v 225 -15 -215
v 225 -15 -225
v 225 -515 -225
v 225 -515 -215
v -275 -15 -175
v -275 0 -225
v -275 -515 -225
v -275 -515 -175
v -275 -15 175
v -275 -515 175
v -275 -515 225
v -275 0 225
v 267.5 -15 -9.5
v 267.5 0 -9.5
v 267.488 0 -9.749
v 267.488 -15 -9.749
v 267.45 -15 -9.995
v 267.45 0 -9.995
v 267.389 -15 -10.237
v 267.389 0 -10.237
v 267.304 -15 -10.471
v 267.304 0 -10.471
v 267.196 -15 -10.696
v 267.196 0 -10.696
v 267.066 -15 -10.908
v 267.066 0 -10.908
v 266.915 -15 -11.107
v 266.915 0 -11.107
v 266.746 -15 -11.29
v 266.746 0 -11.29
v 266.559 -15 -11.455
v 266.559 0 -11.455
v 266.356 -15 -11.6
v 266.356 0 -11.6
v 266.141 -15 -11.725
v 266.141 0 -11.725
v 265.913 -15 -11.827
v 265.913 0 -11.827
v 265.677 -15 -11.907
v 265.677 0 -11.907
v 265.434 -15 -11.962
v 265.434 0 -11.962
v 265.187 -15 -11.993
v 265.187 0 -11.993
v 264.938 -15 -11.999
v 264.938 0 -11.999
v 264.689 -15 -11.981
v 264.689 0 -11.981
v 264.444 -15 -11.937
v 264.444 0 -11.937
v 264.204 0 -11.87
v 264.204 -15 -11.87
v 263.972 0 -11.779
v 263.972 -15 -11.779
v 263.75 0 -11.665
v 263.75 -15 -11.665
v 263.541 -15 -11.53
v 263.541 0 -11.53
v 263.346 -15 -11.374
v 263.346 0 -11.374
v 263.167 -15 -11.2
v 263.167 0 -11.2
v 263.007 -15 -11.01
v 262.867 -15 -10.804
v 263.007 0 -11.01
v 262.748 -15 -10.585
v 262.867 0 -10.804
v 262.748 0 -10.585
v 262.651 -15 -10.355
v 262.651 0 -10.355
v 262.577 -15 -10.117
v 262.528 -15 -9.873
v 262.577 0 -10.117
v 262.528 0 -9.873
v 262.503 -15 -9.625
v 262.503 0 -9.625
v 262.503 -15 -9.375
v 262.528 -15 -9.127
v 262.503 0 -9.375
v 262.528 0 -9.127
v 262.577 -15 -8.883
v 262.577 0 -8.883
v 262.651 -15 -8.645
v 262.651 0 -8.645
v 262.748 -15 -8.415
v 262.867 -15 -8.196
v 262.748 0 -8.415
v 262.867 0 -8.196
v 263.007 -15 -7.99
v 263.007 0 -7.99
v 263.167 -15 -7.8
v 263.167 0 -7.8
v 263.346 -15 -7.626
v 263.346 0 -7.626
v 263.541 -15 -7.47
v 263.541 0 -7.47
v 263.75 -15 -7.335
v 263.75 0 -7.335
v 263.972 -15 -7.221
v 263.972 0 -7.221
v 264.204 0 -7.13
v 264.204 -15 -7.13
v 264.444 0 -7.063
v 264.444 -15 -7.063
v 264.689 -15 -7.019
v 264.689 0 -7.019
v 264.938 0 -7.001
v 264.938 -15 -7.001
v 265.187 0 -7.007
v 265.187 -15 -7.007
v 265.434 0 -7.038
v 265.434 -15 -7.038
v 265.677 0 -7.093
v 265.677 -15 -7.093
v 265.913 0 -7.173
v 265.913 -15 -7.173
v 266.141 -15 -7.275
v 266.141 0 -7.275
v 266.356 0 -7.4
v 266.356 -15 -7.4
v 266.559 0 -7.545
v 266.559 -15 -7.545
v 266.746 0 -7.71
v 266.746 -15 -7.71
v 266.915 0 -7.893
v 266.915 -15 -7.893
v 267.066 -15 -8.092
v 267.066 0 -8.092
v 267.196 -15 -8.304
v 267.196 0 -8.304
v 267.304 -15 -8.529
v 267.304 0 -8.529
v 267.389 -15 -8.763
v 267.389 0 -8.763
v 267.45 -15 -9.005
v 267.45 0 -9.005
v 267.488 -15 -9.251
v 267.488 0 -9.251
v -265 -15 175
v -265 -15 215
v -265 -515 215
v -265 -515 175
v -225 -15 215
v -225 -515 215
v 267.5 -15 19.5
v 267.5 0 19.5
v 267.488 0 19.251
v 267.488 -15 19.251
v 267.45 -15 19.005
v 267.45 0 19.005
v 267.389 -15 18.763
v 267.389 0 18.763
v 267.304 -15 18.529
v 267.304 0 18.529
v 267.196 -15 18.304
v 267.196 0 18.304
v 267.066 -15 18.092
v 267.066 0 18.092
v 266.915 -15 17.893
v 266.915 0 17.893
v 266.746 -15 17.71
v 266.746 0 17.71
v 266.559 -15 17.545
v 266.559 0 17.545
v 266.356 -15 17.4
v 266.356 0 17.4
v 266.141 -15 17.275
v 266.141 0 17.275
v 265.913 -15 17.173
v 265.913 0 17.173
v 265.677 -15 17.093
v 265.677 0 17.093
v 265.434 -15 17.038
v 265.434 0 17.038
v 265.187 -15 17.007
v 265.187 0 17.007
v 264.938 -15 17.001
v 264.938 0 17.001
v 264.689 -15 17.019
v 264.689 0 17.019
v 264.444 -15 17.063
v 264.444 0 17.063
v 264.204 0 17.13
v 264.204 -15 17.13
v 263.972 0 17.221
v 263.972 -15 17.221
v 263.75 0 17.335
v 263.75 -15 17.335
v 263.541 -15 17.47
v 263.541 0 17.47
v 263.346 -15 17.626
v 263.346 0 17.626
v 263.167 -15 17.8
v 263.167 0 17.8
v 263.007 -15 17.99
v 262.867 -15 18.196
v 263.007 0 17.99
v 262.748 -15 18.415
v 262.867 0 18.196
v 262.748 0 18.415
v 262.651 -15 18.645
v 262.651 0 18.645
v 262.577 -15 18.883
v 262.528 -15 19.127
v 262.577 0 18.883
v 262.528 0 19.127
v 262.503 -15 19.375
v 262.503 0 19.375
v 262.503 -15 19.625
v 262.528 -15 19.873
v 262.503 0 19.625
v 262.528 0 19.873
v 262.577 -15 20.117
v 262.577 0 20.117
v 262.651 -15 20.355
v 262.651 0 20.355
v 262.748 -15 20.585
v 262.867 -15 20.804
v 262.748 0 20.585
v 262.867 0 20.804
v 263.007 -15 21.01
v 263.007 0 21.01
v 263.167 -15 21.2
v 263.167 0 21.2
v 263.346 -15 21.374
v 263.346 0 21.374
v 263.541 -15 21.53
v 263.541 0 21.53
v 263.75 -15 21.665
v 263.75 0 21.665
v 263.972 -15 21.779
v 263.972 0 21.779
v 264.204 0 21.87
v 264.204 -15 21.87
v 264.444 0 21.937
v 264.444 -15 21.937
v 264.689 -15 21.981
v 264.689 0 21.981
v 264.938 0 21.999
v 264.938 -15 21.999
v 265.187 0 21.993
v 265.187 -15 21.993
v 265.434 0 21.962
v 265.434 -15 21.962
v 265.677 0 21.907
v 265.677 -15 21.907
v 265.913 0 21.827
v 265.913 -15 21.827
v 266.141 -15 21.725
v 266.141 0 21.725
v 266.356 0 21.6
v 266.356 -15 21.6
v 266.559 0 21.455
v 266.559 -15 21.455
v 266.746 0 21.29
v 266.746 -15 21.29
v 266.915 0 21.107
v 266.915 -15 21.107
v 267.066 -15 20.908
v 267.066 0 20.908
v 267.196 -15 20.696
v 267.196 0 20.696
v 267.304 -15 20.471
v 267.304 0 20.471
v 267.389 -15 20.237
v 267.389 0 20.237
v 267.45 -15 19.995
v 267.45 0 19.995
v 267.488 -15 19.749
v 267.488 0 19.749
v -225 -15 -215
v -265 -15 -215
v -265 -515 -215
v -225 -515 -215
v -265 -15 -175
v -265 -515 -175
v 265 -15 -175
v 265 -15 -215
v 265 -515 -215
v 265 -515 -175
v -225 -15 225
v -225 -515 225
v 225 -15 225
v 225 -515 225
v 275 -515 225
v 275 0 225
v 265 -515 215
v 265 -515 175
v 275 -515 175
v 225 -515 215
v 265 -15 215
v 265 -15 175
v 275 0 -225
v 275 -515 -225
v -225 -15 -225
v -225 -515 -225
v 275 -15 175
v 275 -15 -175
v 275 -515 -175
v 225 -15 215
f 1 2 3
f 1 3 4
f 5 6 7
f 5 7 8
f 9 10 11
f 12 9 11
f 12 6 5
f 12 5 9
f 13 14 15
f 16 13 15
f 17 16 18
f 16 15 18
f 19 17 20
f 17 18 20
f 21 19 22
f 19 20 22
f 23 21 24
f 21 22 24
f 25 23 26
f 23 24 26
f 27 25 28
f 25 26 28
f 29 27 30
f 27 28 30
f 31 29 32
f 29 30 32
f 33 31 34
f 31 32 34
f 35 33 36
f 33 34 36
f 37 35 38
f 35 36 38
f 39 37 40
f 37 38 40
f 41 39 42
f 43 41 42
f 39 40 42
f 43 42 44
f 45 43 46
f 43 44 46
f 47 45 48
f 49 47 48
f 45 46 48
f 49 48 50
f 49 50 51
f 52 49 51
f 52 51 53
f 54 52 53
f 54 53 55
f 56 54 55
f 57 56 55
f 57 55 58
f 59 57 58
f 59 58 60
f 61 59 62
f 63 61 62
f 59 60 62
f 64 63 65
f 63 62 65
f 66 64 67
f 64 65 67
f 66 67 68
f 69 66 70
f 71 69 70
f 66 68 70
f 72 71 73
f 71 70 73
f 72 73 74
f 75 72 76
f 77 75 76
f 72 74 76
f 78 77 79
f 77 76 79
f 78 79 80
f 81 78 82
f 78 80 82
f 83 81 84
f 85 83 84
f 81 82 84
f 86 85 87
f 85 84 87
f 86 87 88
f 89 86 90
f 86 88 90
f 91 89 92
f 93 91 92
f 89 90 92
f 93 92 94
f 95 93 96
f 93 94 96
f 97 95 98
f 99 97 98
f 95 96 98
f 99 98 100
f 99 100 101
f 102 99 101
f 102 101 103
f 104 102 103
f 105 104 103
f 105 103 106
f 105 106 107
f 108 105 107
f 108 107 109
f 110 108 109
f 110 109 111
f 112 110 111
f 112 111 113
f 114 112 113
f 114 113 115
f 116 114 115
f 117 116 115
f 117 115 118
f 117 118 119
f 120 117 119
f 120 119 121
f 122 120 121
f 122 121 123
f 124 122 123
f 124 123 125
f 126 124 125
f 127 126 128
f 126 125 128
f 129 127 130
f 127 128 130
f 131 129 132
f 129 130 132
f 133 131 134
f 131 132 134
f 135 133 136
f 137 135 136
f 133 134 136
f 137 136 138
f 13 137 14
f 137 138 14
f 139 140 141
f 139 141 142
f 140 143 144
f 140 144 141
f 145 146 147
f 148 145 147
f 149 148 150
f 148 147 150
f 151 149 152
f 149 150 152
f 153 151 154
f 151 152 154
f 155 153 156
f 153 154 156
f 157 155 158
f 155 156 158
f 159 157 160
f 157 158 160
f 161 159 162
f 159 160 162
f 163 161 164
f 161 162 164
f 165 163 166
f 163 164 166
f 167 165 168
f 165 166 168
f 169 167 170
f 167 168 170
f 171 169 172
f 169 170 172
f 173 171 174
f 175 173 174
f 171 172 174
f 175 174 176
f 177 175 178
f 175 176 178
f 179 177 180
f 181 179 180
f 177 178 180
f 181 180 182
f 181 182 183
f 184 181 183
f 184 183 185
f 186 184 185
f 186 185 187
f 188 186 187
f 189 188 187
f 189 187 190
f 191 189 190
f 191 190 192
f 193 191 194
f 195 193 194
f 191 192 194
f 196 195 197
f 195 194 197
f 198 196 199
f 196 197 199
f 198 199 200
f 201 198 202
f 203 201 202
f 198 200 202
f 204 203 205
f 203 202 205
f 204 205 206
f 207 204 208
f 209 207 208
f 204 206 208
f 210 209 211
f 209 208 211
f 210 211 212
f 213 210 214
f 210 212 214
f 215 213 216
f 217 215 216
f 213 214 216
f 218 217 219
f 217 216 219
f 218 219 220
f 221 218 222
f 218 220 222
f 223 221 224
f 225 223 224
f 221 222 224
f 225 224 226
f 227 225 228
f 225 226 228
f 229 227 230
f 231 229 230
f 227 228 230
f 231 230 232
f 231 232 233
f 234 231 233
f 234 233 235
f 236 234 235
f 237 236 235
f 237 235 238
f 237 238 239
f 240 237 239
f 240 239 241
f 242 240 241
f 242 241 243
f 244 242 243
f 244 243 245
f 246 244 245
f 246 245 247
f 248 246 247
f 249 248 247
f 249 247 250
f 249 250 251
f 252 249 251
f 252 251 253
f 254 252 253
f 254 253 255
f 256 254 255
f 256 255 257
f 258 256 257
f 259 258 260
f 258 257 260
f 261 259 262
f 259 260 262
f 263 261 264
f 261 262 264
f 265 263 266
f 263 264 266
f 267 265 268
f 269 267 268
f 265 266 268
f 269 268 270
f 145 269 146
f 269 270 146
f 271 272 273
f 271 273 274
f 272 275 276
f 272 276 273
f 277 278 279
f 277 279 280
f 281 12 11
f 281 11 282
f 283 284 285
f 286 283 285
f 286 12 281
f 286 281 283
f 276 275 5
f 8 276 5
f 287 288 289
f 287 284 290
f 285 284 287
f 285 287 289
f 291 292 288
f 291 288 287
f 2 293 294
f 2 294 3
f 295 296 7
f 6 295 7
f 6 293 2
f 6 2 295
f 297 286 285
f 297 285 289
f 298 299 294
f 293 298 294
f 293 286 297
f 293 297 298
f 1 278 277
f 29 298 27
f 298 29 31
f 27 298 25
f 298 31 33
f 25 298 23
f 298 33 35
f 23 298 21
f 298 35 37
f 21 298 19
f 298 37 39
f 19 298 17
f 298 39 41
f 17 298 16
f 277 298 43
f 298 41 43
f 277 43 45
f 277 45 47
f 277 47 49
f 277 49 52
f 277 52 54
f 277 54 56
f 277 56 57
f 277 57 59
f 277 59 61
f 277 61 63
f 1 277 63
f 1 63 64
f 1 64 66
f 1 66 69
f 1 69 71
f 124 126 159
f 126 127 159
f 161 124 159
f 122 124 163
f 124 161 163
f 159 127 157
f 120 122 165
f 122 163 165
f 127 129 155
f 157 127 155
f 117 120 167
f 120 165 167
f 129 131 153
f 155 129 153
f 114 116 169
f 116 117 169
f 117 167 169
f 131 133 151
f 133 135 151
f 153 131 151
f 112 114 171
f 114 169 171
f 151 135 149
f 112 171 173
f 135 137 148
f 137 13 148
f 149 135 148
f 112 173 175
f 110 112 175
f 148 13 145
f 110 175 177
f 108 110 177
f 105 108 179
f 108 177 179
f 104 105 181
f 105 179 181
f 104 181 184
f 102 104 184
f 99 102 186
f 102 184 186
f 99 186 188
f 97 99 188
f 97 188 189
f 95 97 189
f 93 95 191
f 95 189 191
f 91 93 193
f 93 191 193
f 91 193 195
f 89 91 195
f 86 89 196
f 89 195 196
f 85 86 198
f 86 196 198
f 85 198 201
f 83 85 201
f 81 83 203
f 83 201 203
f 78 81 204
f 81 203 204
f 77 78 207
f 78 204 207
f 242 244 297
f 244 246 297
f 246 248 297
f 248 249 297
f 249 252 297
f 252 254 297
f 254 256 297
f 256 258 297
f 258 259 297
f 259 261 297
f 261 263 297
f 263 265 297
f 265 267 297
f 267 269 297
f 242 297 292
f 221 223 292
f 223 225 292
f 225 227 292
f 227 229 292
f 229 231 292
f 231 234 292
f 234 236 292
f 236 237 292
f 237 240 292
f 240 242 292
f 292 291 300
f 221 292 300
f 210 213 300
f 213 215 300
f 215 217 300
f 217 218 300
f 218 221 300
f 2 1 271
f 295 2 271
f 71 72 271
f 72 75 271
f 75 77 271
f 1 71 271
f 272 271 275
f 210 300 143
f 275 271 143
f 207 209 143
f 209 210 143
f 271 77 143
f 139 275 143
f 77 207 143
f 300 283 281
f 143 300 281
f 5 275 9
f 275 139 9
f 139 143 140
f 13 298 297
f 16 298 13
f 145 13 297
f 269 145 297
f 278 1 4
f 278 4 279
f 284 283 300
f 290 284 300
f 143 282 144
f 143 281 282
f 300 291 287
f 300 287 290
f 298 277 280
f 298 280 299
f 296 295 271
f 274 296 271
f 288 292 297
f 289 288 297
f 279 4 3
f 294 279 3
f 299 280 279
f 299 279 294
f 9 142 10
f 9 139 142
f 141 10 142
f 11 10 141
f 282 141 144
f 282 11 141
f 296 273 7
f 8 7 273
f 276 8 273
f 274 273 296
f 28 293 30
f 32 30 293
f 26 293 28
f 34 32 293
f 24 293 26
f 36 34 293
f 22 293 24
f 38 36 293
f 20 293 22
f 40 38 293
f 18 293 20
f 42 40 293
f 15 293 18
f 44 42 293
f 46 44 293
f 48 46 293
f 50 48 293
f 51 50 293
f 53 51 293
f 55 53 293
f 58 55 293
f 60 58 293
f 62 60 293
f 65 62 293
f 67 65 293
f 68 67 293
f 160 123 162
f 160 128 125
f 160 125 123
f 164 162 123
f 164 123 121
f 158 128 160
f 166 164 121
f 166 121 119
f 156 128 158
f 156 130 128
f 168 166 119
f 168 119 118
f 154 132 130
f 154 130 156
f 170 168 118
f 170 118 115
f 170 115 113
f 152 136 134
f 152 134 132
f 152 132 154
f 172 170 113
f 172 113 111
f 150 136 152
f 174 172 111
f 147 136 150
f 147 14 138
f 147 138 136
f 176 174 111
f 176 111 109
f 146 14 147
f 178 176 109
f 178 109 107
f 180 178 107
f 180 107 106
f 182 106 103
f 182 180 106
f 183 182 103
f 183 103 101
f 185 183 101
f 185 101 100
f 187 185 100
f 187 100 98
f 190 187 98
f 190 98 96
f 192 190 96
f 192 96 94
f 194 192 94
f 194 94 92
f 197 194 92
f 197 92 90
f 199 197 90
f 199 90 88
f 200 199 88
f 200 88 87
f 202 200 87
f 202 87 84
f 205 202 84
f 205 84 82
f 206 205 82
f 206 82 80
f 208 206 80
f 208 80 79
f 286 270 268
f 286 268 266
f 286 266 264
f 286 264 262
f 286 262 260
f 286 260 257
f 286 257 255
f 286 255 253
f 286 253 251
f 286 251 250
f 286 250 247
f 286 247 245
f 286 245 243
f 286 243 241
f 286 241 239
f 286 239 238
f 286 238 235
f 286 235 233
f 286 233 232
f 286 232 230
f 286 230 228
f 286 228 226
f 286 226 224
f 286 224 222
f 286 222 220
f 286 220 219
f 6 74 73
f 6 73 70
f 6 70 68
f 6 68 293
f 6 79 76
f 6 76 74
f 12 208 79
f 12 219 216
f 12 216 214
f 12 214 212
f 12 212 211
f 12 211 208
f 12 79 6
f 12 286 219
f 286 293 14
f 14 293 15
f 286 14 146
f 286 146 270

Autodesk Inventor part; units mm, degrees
ref_plane "YZ Plane" through (0, 0, 0) normal (1, 0, 0) x (0, 1, 0)
ref_plane "XZ Plane" through (0, 0, 0) normal (0, 1, 0) x (-1, 0, 0)
ref_plane "XY Plane" through (0, 0, 0) normal (0, 0, 1) x (1, 0, 0)
sketch "Sketch1" plane through (0, 0, 0) normal (0, 1, 0) x (-1, 0, 0)
  line L0 (275, 225) -> (-275, 225)
  line L1 (-275, 225) -> (-275, -225)
  line L2 (-275, -225) -> (275, -225)
  line L3 (275, -225) -> (275, 225)
  line L4 (275, 225) -> (-275, -225) construction
  line L5 (-275, 225) -> (275, -225) construction
  point P0 (0, 0)
  dimension "d0" = 550
  dimension "d1" = 450
extrude "Extrusion1" add sketch "Sketch1" against normal blind 15
sketch "Sketch2" plane through (0, -15, 0) normal (0, -1, 0) x (1, 0, 0)
  line L0 (275, -225) -> (275, 225) projected
  line L1 (275, 225) -> (225, 225)
  line L2 (225, 225) -> (225, 175)
  line L3 (225, 175) -> (275, 175)
  line L4 (275, 175) -> (275, 225)
  line L5 (-275, -225) -> (275, -225) projected
  line L6 (275, -225) -> (225, -225)
  line L7 (225, -225) -> (225, -175)
  line L8 (225, -175) -> (275, -175)
  line L9 (275, -175) -> (275, -225)
  line L10 (-275, 225) -> (-275, -225) projected
  line L11 (-275, -225) -> (-225, -225)
  line L12 (-225, -225) -> (-225, -175)
  line L13 (-225, -175) -> (-275, -175)
  line L14 (-275, -175) -> (-275, -225)
  line L15 (-275, 225) -> (-225, 225)
  line L16 (-225, 225) -> (-225, 175)
  line L17 (-225, 175) -> (-275, 175)
  line L18 (-275, 175) -> (-275, 225)
  point P0 (0, 0)
  dimension "d4" = 50
  dimension "d5" = 50
  dimension "d6" = 50
  dimension "d7" = 50
extrude "Extrusion2" add sketch "Sketch2" along normal blind 500
sketch "Sketch3" plane through (0, -515, 0) normal (0, -1, 0) x (1, 0, 0)
  line L0 (225, 175) -> (275, 175) projected
  line L1 (225, 175) -> (265, 175)
  line L2 (265, 175) -> (265, 215)
  line L3 (265, 215) -> (225, 215)
  line L4 (225, 215) -> (225, 175)
  point P0 (0, 0)
  dimension "d10" = 40
  dimension "d11" = 40
extrude "Extrusion3" cut sketch "Sketch3" against normal blind 500
mirror "Mirror1" about plane through (0, 0, 0) normal (1, 0, 0) of "Extrusion3"
mirror "Mirror2" about plane through (0, 0, 0) normal (0, 0, 1) of "Extrusion3"
sketch "Sketch4" plane through (0, -515, 0) normal (0, -1, 0) x (1, 0, 0)
  line L0 (-275, -175) -> (-225, -175) projected
  line L1 (-225, -175) -> (-265, -175)
  line L2 (-265, -175) -> (-265, -215)
  line L3 (-265, -215) -> (-225, -215)
  line L4 (-225, -215) -> (-225, -175)
  point P0 (0, 0)
  dimension "d14" = 40
  dimension "d15" = 40
extrude "Extrusion4" cut sketch "Sketch4" against normal blind 500
sketch "Sketch5" plane through (0, 0, 0) normal (0, 1, 0) x (1, 0, 0)
  line L0 (275, -225) -> (275, 225) projected
  line L1 (275, 0) -> (265, 0)
  line L2 (265, 0) -> (265, -19.5)
  line L3 (265, -19.5) -> (265, 9.5)
  circle A0 centre (265, 9.5) radius 2.5
  circle A1 centre (265, -19.5) radius 2.5
  point P0 (0, 0)
  dimension "d18" = 10
  dimension "d19" = 19.5
  dimension "d20" = 29
  dimension "d21" = 5
  dimension "d22" = 5
extrude "Extrusion5" cut sketch "Sketch5" against normal through all
thread "Thread1" size "M5x0.8" class "6H" standard "ISO Metric profile" full length
thread "Thread2" size "M5x0.8" class "6H" standard "ISO Metric profile" full length
ref_plane "Work Plane1" through (0, 0, 0) normal (1, 0, 0) x (0, 1, 0)
ref_plane "Work Plane2" through (0, 0, 0) normal (0, 0, 1) x (1, 0, 0)
properties part number "Work table" material "Steel, Mild"
